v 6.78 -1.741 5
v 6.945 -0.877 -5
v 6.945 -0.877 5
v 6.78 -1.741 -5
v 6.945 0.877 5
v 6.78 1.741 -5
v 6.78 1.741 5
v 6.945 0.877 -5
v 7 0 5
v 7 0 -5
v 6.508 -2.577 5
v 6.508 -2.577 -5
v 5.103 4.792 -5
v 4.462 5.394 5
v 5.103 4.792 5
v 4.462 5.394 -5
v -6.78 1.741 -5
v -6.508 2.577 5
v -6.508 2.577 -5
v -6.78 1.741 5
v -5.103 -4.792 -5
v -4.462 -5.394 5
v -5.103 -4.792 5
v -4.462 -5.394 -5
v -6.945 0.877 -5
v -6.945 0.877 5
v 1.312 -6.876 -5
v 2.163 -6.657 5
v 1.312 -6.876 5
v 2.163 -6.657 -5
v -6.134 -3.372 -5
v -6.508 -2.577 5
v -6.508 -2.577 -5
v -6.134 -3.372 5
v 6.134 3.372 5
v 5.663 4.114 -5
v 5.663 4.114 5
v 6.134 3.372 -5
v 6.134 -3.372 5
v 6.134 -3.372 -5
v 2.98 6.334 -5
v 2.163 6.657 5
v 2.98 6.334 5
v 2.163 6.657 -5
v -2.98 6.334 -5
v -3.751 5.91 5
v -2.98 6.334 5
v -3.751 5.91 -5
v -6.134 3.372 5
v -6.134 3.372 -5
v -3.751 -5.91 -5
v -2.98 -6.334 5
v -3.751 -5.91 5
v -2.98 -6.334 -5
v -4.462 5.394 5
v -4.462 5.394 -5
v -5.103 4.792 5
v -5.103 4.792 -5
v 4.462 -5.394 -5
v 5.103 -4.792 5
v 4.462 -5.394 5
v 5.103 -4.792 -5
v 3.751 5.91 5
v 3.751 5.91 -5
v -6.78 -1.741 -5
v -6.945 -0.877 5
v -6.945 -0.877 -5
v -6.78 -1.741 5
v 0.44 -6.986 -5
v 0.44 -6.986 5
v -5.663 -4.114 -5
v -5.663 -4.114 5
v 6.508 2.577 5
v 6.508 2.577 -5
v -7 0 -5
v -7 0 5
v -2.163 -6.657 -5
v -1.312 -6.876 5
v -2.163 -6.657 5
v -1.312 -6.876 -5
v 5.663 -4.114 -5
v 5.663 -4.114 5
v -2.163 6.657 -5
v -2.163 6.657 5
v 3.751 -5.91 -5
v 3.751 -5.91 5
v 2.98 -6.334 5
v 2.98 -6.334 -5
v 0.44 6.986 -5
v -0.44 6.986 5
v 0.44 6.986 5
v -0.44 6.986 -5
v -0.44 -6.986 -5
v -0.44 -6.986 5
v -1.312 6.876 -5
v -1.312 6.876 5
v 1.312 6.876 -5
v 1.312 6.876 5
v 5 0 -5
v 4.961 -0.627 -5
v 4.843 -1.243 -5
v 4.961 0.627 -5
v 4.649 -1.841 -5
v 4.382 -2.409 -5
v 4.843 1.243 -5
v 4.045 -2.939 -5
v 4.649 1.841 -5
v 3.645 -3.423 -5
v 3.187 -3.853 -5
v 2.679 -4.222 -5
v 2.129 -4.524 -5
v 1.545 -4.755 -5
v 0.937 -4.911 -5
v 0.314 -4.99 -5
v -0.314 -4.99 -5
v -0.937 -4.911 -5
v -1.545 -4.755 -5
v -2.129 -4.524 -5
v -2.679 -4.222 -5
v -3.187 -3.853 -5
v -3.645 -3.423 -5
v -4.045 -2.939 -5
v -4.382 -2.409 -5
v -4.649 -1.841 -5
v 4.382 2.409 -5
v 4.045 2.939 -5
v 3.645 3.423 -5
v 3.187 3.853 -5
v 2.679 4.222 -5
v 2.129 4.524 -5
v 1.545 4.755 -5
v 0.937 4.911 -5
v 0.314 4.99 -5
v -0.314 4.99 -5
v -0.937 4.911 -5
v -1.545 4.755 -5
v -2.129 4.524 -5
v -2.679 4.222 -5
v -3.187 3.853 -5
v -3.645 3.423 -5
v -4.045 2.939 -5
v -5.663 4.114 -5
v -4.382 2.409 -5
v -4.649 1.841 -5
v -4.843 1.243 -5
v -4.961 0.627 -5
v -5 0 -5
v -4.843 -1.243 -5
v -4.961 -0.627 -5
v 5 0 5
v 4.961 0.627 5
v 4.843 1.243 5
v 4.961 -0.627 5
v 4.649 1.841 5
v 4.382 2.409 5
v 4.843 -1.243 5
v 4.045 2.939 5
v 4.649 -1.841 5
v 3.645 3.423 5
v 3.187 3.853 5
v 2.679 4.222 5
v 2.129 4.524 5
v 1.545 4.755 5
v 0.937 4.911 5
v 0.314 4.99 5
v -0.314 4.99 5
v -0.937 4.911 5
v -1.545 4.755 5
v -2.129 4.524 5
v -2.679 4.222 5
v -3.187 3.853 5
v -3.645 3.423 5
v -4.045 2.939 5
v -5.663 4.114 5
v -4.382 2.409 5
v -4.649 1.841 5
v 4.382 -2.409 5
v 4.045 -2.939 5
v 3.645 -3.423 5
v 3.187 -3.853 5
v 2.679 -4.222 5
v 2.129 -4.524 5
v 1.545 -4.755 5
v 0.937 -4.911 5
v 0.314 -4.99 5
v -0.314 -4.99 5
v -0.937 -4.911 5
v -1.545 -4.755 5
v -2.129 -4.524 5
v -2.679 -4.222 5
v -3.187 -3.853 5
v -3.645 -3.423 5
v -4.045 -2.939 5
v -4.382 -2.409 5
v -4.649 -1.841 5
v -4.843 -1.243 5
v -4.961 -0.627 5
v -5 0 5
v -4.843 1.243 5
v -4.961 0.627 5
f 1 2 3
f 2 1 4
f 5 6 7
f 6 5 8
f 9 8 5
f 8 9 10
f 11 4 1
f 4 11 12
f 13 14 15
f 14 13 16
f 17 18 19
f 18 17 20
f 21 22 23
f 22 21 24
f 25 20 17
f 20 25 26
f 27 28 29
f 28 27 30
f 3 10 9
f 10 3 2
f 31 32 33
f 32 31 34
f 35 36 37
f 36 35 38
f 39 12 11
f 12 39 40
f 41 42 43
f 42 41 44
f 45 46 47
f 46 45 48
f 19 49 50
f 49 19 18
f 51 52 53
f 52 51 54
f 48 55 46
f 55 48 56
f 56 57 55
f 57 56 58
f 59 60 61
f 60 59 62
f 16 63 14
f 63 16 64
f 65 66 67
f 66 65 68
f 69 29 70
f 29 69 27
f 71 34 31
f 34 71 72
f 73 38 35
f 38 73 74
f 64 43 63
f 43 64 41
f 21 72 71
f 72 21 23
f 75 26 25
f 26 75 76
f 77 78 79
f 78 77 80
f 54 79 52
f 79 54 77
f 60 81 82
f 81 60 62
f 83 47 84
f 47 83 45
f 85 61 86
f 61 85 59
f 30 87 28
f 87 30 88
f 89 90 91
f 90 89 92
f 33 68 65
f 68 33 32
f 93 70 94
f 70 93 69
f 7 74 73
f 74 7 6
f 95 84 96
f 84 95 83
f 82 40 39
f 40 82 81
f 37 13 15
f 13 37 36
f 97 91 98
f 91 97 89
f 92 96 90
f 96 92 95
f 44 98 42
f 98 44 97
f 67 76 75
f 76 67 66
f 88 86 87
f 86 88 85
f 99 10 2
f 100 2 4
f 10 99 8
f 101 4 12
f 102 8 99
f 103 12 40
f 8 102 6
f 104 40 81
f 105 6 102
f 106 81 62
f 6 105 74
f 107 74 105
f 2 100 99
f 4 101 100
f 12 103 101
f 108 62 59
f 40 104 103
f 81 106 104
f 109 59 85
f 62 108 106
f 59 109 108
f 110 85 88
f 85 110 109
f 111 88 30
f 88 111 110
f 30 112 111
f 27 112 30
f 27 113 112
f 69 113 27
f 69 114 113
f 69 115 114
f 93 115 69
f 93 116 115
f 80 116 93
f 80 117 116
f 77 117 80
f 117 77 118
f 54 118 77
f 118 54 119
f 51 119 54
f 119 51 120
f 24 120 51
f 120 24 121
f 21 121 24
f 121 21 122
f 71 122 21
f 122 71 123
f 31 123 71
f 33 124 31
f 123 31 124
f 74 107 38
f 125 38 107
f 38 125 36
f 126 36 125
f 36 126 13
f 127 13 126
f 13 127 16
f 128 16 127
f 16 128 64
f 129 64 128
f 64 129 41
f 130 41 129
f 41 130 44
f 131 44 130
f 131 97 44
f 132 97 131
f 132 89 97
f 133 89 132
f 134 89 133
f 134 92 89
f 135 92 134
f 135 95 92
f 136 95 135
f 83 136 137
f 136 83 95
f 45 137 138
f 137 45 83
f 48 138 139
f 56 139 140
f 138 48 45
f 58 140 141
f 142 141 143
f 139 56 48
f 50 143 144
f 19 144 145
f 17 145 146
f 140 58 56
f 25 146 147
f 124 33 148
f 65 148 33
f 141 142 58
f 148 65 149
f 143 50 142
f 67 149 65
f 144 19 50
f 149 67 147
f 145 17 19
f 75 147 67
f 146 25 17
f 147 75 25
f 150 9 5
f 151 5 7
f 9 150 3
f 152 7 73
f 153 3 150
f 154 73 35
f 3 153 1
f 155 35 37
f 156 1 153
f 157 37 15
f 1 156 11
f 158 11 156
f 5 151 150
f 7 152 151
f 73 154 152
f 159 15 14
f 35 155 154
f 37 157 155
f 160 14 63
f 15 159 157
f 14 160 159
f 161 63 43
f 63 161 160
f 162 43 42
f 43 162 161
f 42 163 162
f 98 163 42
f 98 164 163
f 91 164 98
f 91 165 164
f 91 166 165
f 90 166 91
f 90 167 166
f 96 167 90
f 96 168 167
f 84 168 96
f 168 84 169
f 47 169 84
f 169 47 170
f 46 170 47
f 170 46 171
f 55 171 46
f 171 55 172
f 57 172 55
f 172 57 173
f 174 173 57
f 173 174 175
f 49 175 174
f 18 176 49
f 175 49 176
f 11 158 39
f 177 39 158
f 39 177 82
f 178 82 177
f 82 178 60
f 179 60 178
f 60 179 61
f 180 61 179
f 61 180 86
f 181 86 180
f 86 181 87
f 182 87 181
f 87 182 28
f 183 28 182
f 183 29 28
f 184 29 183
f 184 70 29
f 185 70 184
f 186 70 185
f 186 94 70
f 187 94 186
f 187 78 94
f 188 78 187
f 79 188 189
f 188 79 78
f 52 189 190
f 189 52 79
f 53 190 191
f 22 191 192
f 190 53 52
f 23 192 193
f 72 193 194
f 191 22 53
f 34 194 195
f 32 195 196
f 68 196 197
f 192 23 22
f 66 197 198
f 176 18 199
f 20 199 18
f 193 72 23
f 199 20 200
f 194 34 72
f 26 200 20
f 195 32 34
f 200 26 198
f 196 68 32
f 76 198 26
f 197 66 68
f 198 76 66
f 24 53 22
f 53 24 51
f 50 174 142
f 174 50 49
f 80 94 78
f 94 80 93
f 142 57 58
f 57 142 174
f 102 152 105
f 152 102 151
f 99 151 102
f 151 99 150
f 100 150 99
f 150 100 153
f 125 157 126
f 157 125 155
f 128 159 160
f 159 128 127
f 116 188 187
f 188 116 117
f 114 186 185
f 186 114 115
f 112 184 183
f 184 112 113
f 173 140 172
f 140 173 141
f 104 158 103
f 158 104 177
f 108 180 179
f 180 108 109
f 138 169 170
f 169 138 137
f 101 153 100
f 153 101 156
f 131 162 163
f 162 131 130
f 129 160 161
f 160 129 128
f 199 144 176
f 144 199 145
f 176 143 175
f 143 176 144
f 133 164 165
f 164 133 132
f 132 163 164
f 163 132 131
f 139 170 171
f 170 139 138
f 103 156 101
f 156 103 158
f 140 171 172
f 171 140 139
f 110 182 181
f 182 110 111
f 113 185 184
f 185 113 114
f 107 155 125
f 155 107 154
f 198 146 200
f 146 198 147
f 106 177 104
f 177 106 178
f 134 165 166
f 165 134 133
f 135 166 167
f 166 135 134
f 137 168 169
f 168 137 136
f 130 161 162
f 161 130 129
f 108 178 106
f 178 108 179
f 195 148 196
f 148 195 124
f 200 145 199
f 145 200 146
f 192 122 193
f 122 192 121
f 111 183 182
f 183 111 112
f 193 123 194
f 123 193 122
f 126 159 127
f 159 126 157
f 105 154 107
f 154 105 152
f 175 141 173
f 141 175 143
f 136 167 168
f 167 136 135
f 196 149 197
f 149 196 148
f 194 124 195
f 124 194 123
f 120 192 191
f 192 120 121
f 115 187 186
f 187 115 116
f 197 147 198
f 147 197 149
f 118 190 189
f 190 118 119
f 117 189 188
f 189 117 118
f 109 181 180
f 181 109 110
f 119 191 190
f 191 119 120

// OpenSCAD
$fn = 50;


difference() {
	union() {
		translate(v = [0, 0, -5.0000000000]) {
			cylinder(h = 10, r = 7.0000000000);
		}
	}
	union() {
		translate(v = [0, 0, -100.0000000000]) {
			cylinder(h = 200, r = 5.0000000000);
		}
	}
}
